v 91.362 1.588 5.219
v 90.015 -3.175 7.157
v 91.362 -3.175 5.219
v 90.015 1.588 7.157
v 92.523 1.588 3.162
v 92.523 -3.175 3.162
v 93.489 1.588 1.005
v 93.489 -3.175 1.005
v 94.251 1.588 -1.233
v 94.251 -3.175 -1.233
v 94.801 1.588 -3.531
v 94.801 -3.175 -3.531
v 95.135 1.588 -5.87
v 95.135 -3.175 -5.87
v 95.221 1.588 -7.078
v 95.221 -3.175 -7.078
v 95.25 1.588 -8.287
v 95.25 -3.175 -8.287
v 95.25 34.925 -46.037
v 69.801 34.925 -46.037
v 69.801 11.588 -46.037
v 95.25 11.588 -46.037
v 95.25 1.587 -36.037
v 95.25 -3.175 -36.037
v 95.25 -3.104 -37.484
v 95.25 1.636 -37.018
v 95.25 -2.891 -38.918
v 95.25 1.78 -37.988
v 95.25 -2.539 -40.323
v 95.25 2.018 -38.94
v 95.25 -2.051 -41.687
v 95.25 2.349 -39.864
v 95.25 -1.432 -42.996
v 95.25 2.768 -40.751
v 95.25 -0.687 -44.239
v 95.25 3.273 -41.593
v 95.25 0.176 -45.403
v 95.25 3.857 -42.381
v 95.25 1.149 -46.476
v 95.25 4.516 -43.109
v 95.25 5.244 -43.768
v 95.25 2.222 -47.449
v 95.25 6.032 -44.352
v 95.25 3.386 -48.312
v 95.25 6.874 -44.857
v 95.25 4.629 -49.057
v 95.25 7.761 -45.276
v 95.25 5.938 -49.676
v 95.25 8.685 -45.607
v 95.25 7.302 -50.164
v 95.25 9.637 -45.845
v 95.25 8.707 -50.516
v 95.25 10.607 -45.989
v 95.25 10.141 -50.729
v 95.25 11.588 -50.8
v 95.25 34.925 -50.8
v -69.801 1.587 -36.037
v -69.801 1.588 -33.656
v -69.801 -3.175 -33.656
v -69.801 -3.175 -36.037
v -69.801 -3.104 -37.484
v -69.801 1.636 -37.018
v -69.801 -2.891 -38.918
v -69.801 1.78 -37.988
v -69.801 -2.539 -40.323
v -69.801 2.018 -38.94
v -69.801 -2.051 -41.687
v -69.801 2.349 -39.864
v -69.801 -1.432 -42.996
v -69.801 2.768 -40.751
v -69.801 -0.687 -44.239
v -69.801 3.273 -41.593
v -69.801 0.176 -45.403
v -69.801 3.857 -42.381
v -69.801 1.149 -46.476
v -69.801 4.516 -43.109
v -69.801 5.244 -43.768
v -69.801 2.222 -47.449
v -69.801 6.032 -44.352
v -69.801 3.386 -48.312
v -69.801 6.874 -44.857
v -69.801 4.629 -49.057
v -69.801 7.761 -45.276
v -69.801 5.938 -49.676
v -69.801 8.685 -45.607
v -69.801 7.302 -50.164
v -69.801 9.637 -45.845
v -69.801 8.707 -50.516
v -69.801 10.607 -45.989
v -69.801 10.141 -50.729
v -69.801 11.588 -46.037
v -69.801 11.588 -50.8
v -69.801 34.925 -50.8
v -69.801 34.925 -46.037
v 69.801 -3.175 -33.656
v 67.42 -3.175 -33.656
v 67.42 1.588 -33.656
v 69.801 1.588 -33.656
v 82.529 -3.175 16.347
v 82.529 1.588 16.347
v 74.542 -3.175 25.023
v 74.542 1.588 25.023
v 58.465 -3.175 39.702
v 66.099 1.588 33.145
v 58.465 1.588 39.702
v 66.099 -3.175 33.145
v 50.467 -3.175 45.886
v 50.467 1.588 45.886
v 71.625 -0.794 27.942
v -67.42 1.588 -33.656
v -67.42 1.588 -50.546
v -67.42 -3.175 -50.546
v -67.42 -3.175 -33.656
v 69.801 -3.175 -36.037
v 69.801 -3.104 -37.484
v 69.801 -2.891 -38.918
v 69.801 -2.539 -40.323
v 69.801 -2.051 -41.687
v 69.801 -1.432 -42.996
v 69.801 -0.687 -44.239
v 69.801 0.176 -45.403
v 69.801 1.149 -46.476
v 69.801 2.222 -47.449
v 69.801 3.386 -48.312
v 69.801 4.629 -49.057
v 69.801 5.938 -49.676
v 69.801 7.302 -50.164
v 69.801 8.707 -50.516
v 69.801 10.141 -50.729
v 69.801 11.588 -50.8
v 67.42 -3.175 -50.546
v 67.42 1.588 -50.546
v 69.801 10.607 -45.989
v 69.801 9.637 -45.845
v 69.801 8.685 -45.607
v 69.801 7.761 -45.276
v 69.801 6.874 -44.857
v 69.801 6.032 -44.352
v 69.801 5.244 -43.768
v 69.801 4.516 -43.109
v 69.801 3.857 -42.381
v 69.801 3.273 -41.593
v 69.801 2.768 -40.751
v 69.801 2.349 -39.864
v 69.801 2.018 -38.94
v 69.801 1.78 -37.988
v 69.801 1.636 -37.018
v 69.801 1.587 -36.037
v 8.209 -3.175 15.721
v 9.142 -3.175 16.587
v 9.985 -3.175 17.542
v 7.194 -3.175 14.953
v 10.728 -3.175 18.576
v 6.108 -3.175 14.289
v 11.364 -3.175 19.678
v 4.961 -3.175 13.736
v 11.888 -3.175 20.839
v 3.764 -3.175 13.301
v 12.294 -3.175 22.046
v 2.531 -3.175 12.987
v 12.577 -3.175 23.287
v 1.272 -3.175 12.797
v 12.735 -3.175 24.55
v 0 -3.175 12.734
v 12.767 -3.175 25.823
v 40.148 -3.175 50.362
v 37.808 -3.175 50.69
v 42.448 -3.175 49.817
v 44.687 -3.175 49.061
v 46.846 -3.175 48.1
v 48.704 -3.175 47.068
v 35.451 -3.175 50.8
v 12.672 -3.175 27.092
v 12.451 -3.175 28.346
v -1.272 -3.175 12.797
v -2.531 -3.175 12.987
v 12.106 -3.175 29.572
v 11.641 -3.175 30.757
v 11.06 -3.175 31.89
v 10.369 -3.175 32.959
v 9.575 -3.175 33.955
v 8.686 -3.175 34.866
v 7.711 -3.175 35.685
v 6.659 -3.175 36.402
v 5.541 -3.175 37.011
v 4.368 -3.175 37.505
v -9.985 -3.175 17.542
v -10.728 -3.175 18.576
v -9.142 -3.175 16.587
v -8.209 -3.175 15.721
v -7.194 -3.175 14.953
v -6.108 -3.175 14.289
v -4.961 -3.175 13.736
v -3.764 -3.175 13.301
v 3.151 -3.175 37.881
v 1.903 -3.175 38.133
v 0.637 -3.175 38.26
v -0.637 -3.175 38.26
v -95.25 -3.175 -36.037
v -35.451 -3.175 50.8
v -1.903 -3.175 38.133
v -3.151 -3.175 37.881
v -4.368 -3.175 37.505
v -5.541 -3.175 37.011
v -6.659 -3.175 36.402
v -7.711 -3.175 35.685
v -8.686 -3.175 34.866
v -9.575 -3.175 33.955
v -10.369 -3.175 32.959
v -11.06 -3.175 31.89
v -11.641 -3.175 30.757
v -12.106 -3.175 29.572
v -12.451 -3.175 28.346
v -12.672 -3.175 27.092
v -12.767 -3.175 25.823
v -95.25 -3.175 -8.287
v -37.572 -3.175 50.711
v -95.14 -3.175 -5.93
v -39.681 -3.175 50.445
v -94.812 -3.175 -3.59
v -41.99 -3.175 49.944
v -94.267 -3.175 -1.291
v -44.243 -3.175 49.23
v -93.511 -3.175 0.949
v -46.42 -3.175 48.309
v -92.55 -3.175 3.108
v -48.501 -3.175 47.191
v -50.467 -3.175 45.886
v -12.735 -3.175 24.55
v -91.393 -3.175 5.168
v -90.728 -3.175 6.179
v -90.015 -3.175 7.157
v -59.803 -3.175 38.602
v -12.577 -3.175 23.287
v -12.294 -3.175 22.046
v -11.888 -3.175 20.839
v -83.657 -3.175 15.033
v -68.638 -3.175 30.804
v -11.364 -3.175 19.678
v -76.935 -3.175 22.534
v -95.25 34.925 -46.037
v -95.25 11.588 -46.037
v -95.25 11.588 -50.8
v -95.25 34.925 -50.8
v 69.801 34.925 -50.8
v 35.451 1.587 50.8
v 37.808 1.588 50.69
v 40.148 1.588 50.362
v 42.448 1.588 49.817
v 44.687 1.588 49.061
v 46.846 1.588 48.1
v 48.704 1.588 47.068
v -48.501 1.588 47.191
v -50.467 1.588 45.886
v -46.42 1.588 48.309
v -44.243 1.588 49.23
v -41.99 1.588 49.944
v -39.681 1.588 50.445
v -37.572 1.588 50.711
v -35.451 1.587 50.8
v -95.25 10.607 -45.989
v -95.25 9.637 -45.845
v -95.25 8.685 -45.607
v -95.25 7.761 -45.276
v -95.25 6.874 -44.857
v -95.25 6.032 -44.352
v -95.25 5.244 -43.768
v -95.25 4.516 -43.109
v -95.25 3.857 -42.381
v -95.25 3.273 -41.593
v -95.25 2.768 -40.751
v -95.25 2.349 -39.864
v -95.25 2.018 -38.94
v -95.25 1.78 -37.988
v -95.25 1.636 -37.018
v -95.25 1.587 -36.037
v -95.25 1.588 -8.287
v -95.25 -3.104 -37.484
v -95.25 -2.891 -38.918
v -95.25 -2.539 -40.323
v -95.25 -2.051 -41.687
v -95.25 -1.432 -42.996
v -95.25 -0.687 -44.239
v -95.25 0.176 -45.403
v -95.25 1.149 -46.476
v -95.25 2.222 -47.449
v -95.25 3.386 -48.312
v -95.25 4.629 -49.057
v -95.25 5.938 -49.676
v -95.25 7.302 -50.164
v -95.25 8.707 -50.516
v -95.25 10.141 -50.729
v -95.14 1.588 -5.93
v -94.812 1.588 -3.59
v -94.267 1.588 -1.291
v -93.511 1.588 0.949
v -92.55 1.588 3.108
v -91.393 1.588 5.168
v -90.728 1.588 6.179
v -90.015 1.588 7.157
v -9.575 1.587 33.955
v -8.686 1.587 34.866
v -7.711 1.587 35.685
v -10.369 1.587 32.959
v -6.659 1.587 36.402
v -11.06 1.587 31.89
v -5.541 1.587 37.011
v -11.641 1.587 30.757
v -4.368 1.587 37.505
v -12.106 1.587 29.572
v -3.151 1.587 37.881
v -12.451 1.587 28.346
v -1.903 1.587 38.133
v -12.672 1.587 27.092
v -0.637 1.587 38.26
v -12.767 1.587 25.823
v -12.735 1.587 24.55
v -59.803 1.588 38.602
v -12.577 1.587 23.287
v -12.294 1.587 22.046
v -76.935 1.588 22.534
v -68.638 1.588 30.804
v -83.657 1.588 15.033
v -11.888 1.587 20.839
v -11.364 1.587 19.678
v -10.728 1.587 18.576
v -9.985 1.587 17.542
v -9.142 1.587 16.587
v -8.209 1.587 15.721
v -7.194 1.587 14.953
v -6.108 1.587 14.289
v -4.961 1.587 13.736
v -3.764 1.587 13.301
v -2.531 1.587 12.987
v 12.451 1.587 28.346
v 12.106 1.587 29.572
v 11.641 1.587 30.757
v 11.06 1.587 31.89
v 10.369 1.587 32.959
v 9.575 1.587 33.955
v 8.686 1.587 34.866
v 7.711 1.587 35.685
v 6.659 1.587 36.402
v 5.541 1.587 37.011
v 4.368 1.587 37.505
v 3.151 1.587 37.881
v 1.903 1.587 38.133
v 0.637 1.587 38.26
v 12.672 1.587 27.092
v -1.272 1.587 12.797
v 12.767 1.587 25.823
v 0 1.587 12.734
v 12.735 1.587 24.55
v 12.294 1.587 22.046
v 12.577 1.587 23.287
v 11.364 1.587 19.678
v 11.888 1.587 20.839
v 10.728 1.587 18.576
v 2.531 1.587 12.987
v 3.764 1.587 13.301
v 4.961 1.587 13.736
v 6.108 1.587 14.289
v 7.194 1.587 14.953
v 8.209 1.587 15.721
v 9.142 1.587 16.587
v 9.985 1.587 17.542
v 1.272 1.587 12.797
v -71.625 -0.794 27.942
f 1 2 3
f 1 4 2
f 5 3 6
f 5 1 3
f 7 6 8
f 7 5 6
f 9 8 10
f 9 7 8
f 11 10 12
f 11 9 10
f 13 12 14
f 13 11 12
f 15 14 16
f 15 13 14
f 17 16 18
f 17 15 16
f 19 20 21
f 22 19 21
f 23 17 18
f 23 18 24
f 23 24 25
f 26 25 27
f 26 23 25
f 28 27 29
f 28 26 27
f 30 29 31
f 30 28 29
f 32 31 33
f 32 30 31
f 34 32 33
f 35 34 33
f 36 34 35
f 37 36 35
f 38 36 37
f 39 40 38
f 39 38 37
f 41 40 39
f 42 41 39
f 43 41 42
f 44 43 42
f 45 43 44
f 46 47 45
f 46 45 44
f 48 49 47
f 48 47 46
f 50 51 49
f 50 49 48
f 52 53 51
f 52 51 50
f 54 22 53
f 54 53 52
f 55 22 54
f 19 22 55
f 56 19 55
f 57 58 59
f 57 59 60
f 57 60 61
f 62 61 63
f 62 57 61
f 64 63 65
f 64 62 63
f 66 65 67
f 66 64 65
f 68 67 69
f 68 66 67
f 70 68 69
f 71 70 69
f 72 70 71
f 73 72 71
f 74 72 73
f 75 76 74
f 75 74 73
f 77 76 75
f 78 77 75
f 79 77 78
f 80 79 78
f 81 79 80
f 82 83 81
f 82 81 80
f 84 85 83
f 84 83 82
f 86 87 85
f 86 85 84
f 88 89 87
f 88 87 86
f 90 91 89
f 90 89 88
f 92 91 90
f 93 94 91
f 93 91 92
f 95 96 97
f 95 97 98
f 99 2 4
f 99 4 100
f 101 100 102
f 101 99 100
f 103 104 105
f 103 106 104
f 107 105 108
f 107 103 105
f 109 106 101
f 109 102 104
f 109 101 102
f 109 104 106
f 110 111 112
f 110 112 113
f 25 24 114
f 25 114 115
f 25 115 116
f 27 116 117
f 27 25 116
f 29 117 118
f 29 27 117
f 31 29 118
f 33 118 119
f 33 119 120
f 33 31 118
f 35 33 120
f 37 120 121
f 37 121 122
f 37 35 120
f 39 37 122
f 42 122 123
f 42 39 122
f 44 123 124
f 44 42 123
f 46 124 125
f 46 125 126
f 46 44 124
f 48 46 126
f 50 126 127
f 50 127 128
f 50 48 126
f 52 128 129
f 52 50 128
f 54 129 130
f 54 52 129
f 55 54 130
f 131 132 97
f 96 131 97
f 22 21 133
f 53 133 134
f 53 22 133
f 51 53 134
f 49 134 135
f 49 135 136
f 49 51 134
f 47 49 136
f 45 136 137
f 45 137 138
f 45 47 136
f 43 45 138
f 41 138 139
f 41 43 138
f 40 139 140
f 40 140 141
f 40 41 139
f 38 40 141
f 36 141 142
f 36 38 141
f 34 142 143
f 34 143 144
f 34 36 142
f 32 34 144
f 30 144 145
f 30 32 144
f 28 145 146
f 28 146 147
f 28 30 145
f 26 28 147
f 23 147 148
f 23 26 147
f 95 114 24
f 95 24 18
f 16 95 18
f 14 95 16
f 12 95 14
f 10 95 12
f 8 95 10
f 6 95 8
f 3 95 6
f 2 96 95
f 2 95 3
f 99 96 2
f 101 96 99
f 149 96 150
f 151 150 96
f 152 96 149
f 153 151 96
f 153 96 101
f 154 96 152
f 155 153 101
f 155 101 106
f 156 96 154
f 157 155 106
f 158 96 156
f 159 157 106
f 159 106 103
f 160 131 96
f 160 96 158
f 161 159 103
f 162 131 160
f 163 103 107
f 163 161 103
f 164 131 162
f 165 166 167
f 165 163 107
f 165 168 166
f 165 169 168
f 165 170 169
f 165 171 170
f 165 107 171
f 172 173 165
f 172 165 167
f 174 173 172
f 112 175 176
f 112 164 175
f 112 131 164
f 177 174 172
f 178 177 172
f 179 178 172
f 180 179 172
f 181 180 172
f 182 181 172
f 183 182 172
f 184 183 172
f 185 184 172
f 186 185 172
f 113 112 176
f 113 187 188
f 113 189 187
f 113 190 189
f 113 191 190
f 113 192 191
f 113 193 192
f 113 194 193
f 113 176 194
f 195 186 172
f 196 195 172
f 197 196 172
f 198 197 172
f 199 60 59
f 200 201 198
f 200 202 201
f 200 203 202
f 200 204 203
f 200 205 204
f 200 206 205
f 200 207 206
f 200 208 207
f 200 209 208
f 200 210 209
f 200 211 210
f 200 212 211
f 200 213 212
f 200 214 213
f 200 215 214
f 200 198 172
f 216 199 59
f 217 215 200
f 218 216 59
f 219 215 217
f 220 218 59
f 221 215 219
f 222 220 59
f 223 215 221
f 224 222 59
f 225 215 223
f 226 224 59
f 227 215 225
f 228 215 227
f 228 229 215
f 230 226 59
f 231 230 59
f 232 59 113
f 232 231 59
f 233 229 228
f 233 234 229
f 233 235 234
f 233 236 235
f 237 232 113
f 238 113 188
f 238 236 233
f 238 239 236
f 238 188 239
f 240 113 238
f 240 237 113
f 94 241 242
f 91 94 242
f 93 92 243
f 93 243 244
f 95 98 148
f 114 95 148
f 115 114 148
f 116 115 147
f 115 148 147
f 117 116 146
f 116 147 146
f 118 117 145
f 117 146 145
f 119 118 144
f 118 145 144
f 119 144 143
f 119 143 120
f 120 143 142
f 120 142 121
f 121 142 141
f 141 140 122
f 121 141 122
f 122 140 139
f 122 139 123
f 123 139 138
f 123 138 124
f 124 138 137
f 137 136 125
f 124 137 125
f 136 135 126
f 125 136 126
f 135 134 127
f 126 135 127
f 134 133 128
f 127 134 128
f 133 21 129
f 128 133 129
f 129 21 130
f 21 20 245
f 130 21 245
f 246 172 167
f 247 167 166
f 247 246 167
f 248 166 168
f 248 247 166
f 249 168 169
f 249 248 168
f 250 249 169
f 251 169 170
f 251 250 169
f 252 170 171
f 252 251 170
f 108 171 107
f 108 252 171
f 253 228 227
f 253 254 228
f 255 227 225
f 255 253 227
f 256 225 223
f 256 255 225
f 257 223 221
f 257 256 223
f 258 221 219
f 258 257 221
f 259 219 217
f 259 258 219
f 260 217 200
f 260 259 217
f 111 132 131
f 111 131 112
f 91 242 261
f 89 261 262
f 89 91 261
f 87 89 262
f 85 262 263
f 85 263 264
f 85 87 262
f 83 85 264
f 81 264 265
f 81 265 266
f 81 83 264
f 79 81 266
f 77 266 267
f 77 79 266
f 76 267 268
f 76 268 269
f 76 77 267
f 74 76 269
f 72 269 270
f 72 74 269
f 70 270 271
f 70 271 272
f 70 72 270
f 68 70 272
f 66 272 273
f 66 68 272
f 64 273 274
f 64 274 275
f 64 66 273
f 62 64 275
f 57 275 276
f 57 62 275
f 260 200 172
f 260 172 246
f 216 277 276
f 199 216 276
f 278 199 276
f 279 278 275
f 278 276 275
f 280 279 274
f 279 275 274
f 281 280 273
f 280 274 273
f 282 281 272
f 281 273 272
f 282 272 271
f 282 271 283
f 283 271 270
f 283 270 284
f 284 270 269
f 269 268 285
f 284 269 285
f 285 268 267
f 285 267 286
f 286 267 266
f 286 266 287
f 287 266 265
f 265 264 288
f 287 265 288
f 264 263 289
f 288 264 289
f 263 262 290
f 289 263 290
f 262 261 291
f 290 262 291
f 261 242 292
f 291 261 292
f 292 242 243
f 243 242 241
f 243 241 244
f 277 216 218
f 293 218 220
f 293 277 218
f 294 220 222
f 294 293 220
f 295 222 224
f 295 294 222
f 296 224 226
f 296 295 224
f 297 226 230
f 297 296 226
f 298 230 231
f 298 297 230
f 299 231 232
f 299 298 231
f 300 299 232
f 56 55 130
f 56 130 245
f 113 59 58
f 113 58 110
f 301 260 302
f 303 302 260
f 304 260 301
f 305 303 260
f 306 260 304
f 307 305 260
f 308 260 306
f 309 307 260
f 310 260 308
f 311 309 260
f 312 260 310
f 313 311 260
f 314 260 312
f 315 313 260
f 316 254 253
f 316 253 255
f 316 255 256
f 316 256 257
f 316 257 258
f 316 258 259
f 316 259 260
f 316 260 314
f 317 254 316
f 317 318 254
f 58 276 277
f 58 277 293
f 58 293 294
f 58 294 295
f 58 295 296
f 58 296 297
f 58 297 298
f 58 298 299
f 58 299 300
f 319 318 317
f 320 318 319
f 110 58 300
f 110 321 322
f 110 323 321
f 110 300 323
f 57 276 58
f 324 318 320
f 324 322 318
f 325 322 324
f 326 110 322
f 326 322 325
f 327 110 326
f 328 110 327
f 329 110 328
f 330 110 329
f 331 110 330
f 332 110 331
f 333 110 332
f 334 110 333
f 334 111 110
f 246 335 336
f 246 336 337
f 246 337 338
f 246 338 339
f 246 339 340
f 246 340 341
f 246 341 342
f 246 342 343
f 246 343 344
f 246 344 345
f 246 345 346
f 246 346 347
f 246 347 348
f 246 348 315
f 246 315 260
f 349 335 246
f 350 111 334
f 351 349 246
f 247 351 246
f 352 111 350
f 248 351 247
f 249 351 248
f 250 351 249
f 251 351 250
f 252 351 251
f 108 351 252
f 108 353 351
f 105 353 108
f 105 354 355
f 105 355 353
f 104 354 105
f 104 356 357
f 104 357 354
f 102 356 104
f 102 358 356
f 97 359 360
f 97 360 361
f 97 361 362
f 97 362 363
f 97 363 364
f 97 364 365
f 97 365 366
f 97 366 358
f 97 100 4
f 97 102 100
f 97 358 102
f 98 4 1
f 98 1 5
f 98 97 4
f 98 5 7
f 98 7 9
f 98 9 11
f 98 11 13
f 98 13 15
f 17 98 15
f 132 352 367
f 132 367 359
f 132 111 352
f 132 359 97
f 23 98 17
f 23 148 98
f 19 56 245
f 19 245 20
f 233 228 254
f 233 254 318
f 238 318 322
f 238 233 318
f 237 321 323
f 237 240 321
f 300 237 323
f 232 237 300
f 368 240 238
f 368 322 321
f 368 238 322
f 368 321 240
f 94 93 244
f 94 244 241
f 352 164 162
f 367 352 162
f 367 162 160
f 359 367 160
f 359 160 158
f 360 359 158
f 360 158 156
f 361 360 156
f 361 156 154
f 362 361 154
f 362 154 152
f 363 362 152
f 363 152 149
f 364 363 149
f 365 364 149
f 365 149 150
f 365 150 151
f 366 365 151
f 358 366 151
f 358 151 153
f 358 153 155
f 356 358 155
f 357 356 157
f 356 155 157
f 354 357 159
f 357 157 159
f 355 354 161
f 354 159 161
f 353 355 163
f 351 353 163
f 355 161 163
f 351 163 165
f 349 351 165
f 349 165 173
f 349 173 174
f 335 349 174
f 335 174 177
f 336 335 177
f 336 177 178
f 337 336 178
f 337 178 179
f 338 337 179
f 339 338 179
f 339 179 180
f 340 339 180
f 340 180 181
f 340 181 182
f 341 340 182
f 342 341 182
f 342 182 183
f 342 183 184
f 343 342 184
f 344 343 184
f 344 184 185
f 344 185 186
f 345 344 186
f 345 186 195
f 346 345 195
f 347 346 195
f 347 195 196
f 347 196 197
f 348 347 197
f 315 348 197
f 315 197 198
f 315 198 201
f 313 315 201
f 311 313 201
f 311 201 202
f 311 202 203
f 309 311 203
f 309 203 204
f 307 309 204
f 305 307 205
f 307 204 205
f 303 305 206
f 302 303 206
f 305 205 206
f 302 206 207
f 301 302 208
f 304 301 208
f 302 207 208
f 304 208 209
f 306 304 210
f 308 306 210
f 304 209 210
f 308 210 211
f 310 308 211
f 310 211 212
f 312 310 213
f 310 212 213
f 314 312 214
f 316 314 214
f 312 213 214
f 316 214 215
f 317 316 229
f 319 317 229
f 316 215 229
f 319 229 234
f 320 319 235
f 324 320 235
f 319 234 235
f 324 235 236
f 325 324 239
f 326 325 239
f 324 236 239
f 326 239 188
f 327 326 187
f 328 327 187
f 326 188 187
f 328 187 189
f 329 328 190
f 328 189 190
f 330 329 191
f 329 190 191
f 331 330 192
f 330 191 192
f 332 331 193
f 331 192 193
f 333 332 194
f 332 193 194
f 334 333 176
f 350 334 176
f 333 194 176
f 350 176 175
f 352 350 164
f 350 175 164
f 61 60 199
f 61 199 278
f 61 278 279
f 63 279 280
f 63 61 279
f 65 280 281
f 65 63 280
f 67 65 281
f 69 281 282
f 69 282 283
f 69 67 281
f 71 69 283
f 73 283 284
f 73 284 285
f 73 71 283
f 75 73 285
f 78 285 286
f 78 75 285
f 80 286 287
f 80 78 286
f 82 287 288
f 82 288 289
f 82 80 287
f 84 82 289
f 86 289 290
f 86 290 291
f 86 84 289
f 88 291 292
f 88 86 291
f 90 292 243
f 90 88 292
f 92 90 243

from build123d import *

# Parameters (mm, degrees)
SKETCH1_W                     = 190.5
SKETCH1_H                     = 101.6
BOSS_EXTRUDE1_DEPTH           = 1.5875
CONVERT_SOLID1_START          = -95.25
CONVERT_SOLID1_OUTLINE_W      = 3.175
CONVERT_SOLID1_OUTLINE_H      = 101.6
CONVERT_SOLID1_DEPTH          = 190.5
CUT_EXTRUDE5_START            = -4.7625
CUT_EXTRUDE5_DEPTH            = 4.7625
FILLET3_R                     = 25.4
FILLET4_R                     = 25.4
FILLET5_R                     = 25.4
FILLET6_R                     = 25.4
SKETCH30_R                    = 12.770921212
CUT_EXTRUDE6_DEPTH            = 38.1
SKETCH35_W                    = 139.601875342
SKETCH35_H                    = 6.35
CUT_EXTRUDE7_DEPTH            = 0.254
EDGE_FLANGE1_STRIP_W          = 39.05
EDGE_FLANGE1_STRIP_H          = 4.7625
EDGE_FLANGE1_STRIP_CUT_DEPTH  = 25.449062329
EDGE_FLANGE1_RELIEF_W         = 41.43125
EDGE_FLANGE1_RELIEF_H         = 2.38125
EDGE_FLANGE1_RELIEF_CUT_DEPTH = 4.7625
EDGE_FLANGE1_DEPTH            = 25.449062329
EDGE_FLANGE2_STRIP_W          = 39.05
EDGE_FLANGE2_STRIP_H          = 4.7625
EDGE_FLANGE2_STRIP_CUT_DEPTH  = 25.449062329
EDGE_FLANGE2_RELIEF_W         = 41.43125
EDGE_FLANGE2_RELIEF_H         = 2.38125
EDGE_FLANGE2_RELIEF_CUT_DEPTH = 4.7625
EDGE_FLANGE2_DEPTH            = 25.449062329


# Read off the part's stored shape, not the designer's step: Convert-Solid1, Cut-Extrude5
# Sheet-metal steps are written as plain solids
with BuildPart() as part:
    # Sketch1 → Boss-Extrude1 (new body)
    with BuildSketch(Plane(origin=(0, 0, 0), x_dir=(1, 0, 0), z_dir=(0, 1, 0))):
        Rectangle(SKETCH1_W, SKETCH1_H)
    extrude(amount=BOSS_EXTRUDE1_DEPTH)

    # Convert-Solid1 outline → Convert-Solid1 (add)
    with BuildSketch(Plane.YZ.offset(CONVERT_SOLID1_START)):
        with Locations((-1.5875, 0)):
            Rectangle(CONVERT_SOLID1_OUTLINE_W, CONVERT_SOLID1_OUTLINE_H)
    extrude(amount=CONVERT_SOLID1_DEPTH)

    # Cut-Extrude5 outline → Cut-Extrude5 (cut)
    with BuildSketch(Plane(origin=(0, 1.5875, 0), x_dir=(1, 0, 0), z_dir=(0, 1, 0)).offset(CUT_EXTRUDE5_START)):
        with BuildLine():
            Line((95.25, -50.8), (95.25, 0))
            add(Edge.make_bspline(
                [(95.25, 0), (74.104329576, -30.281671419), (43.45324244, -50.8)],
                knots=[0, 0, 0, 1, 1, 1], degree=2))
            Line((43.45324244, -50.8), (95.25, -50.8))
        make_face()
        with BuildLine():
            Line((-95.25, -50.8), (-43.45324244, -50.8))
            add(Edge.make_bspline(
                [(-43.45324244, -50.8), (-74.104329576, -30.281671419), (-95.25, 0)],
                knots=[0, 0, 0, 1, 1, 1], degree=2))
            Line((-95.25, 0), (-95.25, -50.8))
        make_face()
    extrude(amount=CUT_EXTRUDE5_DEPTH, mode=Mode.SUBTRACT)

    # Fillet3
    fillet3_edges = [part.edges().sort_by_distance(p)[0] for p in [
        (-95.25, -0.79375, 0),
    ]]
    fillet(fillet3_edges, radius=FILLET3_R)

    # Fillet4
    fillet4_edges = [part.edges().sort_by_distance(p)[0] for p in [
        (-43.45324244, -0.79375, 50.8),
    ]]
    fillet(fillet4_edges, radius=FILLET4_R)

    # Fillet5
    fillet5_edges = [part.edges().sort_by_distance(p)[0] for p in [
        (43.45324244, -0.79375, 50.8),
    ]]
    fillet(fillet5_edges, radius=FILLET5_R)

    # Fillet6
    fillet6_edges = [part.edges().sort_by_distance(p)[0] for p in [
        (95.25, -0.79375, 0),
    ]]
    fillet(fillet6_edges, radius=FILLET6_R)

    # Sketch30 → Cut-Extrude6 (cut)
    with BuildSketch(Plane(origin=(0, -3.175, 0), x_dir=(-1, 0, 0), z_dir=(0, -1, 0))):
        with Locations(Location((0, -25.504506424, 0), (0, 0, 90))):
            Circle(SKETCH30_R)
    extrude(amount=-CUT_EXTRUDE6_DEPTH, mode=Mode.SUBTRACT)

    # Sketch35 → Cut-Extrude7 (cut)
    with BuildSketch(Plane(origin=(0, 0, -50.8), x_dir=(-1, 0, 0), z_dir=(0, 0, -1))):
        Rectangle(SKETCH35_W, SKETCH35_H)
    extrude(amount=-CUT_EXTRUDE7_DEPTH, mode=Mode.SUBTRACT)

    # Edge-Flange1 strip (across the edge) → Edge-Flange1 strip cut (cut)
    with BuildSketch(Plane(origin=(95.25, 1.5875, -50.8), x_dir=(0, 0, 1), z_dir=(-1, 0, 0))):
        with Locations((-4.7625, -2.38125)):
            Rectangle(EDGE_FLANGE1_STRIP_W, EDGE_FLANGE1_STRIP_H)
    extrude(amount=EDGE_FLANGE1_STRIP_CUT_DEPTH, mode=Mode.SUBTRACT)

    # Edge-Flange1 relief (on the sheet) → Edge-Flange1 relief cut (cut)
    with BuildSketch(Plane(origin=(95.25, 1.5875, -36.0375), x_dir=(0, 0, 1), z_dir=(0, 1, 0))):
        with Locations((-18.334375, -26.639687329)):
            Rectangle(EDGE_FLANGE1_RELIEF_W, EDGE_FLANGE1_RELIEF_H)
    extrude(amount=-EDGE_FLANGE1_RELIEF_CUT_DEPTH, mode=Mode.SUBTRACT)

    # Edge-Flange1 section (across the edge) → Edge-Flange1 (add)
    with BuildSketch(Plane(origin=(95.25, 1.5875, -50.8), x_dir=(0, 0, 1), z_dir=(-1, 0, 0))):
        with BuildLine():
            Line((0, 10), (0, 33.3375))
            Line((0, 33.3375), (4.7625, 33.3375))
            Line((4.7625, 33.3375), (4.7625, 10))
            ThreePointArc((4.7625, 10), (7.691432188, 2.928932188), (14.7625, 0))
            Line((14.7625, 0), (14.7625, -4.7625))
            ThreePointArc((14.7625, -4.7625), (4.323836143, -0.438663857), (0, 10))
        make_face()
    extrude(amount=EDGE_FLANGE1_DEPTH)

    # Edge-Flange2 strip (across the edge) → Edge-Flange2 strip cut (cut)
    with BuildSketch(Plane(origin=(-69.800937671, 1.5875, -50.8), x_dir=(0, 0, 1), z_dir=(-1, 0, 0))):
        with Locations((-4.7625, -2.38125)):
            Rectangle(EDGE_FLANGE2_STRIP_W, EDGE_FLANGE2_STRIP_H)
    extrude(amount=EDGE_FLANGE2_STRIP_CUT_DEPTH, mode=Mode.SUBTRACT)

    # Edge-Flange2 relief (on the sheet) → Edge-Flange2 relief cut (cut)
    with BuildSketch(Plane(origin=(-69.800937671, 1.5875, -36.0375), x_dir=(0, 0, 1), z_dir=(0, 1, 0))):
        with Locations((-18.334375, 1.190625)):
            Rectangle(EDGE_FLANGE2_RELIEF_W, EDGE_FLANGE2_RELIEF_H)
    extrude(amount=-EDGE_FLANGE2_RELIEF_CUT_DEPTH, mode=Mode.SUBTRACT)

    # Edge-Flange2 section (across the edge) → Edge-Flange2 (add)
    with BuildSketch(Plane(origin=(-69.800937671, 1.5875, -50.8), x_dir=(0, 0, 1), z_dir=(-1, 0, 0))):
        with BuildLine():
            Line((0, 10), (0, 33.3375))
            Line((0, 33.3375), (4.7625, 33.3375))
            Line((4.7625, 33.3375), (4.7625, 10))
            ThreePointArc((4.7625, 10), (7.691432188, 2.928932188), (14.7625, 0))
            Line((14.7625, 0), (14.7625, -4.7625))
            ThreePointArc((14.7625, -4.7625), (4.323836143, -0.438663857), (0, 10))
        make_face()
    extrude(amount=EDGE_FLANGE2_DEPTH)


solid = part.part
